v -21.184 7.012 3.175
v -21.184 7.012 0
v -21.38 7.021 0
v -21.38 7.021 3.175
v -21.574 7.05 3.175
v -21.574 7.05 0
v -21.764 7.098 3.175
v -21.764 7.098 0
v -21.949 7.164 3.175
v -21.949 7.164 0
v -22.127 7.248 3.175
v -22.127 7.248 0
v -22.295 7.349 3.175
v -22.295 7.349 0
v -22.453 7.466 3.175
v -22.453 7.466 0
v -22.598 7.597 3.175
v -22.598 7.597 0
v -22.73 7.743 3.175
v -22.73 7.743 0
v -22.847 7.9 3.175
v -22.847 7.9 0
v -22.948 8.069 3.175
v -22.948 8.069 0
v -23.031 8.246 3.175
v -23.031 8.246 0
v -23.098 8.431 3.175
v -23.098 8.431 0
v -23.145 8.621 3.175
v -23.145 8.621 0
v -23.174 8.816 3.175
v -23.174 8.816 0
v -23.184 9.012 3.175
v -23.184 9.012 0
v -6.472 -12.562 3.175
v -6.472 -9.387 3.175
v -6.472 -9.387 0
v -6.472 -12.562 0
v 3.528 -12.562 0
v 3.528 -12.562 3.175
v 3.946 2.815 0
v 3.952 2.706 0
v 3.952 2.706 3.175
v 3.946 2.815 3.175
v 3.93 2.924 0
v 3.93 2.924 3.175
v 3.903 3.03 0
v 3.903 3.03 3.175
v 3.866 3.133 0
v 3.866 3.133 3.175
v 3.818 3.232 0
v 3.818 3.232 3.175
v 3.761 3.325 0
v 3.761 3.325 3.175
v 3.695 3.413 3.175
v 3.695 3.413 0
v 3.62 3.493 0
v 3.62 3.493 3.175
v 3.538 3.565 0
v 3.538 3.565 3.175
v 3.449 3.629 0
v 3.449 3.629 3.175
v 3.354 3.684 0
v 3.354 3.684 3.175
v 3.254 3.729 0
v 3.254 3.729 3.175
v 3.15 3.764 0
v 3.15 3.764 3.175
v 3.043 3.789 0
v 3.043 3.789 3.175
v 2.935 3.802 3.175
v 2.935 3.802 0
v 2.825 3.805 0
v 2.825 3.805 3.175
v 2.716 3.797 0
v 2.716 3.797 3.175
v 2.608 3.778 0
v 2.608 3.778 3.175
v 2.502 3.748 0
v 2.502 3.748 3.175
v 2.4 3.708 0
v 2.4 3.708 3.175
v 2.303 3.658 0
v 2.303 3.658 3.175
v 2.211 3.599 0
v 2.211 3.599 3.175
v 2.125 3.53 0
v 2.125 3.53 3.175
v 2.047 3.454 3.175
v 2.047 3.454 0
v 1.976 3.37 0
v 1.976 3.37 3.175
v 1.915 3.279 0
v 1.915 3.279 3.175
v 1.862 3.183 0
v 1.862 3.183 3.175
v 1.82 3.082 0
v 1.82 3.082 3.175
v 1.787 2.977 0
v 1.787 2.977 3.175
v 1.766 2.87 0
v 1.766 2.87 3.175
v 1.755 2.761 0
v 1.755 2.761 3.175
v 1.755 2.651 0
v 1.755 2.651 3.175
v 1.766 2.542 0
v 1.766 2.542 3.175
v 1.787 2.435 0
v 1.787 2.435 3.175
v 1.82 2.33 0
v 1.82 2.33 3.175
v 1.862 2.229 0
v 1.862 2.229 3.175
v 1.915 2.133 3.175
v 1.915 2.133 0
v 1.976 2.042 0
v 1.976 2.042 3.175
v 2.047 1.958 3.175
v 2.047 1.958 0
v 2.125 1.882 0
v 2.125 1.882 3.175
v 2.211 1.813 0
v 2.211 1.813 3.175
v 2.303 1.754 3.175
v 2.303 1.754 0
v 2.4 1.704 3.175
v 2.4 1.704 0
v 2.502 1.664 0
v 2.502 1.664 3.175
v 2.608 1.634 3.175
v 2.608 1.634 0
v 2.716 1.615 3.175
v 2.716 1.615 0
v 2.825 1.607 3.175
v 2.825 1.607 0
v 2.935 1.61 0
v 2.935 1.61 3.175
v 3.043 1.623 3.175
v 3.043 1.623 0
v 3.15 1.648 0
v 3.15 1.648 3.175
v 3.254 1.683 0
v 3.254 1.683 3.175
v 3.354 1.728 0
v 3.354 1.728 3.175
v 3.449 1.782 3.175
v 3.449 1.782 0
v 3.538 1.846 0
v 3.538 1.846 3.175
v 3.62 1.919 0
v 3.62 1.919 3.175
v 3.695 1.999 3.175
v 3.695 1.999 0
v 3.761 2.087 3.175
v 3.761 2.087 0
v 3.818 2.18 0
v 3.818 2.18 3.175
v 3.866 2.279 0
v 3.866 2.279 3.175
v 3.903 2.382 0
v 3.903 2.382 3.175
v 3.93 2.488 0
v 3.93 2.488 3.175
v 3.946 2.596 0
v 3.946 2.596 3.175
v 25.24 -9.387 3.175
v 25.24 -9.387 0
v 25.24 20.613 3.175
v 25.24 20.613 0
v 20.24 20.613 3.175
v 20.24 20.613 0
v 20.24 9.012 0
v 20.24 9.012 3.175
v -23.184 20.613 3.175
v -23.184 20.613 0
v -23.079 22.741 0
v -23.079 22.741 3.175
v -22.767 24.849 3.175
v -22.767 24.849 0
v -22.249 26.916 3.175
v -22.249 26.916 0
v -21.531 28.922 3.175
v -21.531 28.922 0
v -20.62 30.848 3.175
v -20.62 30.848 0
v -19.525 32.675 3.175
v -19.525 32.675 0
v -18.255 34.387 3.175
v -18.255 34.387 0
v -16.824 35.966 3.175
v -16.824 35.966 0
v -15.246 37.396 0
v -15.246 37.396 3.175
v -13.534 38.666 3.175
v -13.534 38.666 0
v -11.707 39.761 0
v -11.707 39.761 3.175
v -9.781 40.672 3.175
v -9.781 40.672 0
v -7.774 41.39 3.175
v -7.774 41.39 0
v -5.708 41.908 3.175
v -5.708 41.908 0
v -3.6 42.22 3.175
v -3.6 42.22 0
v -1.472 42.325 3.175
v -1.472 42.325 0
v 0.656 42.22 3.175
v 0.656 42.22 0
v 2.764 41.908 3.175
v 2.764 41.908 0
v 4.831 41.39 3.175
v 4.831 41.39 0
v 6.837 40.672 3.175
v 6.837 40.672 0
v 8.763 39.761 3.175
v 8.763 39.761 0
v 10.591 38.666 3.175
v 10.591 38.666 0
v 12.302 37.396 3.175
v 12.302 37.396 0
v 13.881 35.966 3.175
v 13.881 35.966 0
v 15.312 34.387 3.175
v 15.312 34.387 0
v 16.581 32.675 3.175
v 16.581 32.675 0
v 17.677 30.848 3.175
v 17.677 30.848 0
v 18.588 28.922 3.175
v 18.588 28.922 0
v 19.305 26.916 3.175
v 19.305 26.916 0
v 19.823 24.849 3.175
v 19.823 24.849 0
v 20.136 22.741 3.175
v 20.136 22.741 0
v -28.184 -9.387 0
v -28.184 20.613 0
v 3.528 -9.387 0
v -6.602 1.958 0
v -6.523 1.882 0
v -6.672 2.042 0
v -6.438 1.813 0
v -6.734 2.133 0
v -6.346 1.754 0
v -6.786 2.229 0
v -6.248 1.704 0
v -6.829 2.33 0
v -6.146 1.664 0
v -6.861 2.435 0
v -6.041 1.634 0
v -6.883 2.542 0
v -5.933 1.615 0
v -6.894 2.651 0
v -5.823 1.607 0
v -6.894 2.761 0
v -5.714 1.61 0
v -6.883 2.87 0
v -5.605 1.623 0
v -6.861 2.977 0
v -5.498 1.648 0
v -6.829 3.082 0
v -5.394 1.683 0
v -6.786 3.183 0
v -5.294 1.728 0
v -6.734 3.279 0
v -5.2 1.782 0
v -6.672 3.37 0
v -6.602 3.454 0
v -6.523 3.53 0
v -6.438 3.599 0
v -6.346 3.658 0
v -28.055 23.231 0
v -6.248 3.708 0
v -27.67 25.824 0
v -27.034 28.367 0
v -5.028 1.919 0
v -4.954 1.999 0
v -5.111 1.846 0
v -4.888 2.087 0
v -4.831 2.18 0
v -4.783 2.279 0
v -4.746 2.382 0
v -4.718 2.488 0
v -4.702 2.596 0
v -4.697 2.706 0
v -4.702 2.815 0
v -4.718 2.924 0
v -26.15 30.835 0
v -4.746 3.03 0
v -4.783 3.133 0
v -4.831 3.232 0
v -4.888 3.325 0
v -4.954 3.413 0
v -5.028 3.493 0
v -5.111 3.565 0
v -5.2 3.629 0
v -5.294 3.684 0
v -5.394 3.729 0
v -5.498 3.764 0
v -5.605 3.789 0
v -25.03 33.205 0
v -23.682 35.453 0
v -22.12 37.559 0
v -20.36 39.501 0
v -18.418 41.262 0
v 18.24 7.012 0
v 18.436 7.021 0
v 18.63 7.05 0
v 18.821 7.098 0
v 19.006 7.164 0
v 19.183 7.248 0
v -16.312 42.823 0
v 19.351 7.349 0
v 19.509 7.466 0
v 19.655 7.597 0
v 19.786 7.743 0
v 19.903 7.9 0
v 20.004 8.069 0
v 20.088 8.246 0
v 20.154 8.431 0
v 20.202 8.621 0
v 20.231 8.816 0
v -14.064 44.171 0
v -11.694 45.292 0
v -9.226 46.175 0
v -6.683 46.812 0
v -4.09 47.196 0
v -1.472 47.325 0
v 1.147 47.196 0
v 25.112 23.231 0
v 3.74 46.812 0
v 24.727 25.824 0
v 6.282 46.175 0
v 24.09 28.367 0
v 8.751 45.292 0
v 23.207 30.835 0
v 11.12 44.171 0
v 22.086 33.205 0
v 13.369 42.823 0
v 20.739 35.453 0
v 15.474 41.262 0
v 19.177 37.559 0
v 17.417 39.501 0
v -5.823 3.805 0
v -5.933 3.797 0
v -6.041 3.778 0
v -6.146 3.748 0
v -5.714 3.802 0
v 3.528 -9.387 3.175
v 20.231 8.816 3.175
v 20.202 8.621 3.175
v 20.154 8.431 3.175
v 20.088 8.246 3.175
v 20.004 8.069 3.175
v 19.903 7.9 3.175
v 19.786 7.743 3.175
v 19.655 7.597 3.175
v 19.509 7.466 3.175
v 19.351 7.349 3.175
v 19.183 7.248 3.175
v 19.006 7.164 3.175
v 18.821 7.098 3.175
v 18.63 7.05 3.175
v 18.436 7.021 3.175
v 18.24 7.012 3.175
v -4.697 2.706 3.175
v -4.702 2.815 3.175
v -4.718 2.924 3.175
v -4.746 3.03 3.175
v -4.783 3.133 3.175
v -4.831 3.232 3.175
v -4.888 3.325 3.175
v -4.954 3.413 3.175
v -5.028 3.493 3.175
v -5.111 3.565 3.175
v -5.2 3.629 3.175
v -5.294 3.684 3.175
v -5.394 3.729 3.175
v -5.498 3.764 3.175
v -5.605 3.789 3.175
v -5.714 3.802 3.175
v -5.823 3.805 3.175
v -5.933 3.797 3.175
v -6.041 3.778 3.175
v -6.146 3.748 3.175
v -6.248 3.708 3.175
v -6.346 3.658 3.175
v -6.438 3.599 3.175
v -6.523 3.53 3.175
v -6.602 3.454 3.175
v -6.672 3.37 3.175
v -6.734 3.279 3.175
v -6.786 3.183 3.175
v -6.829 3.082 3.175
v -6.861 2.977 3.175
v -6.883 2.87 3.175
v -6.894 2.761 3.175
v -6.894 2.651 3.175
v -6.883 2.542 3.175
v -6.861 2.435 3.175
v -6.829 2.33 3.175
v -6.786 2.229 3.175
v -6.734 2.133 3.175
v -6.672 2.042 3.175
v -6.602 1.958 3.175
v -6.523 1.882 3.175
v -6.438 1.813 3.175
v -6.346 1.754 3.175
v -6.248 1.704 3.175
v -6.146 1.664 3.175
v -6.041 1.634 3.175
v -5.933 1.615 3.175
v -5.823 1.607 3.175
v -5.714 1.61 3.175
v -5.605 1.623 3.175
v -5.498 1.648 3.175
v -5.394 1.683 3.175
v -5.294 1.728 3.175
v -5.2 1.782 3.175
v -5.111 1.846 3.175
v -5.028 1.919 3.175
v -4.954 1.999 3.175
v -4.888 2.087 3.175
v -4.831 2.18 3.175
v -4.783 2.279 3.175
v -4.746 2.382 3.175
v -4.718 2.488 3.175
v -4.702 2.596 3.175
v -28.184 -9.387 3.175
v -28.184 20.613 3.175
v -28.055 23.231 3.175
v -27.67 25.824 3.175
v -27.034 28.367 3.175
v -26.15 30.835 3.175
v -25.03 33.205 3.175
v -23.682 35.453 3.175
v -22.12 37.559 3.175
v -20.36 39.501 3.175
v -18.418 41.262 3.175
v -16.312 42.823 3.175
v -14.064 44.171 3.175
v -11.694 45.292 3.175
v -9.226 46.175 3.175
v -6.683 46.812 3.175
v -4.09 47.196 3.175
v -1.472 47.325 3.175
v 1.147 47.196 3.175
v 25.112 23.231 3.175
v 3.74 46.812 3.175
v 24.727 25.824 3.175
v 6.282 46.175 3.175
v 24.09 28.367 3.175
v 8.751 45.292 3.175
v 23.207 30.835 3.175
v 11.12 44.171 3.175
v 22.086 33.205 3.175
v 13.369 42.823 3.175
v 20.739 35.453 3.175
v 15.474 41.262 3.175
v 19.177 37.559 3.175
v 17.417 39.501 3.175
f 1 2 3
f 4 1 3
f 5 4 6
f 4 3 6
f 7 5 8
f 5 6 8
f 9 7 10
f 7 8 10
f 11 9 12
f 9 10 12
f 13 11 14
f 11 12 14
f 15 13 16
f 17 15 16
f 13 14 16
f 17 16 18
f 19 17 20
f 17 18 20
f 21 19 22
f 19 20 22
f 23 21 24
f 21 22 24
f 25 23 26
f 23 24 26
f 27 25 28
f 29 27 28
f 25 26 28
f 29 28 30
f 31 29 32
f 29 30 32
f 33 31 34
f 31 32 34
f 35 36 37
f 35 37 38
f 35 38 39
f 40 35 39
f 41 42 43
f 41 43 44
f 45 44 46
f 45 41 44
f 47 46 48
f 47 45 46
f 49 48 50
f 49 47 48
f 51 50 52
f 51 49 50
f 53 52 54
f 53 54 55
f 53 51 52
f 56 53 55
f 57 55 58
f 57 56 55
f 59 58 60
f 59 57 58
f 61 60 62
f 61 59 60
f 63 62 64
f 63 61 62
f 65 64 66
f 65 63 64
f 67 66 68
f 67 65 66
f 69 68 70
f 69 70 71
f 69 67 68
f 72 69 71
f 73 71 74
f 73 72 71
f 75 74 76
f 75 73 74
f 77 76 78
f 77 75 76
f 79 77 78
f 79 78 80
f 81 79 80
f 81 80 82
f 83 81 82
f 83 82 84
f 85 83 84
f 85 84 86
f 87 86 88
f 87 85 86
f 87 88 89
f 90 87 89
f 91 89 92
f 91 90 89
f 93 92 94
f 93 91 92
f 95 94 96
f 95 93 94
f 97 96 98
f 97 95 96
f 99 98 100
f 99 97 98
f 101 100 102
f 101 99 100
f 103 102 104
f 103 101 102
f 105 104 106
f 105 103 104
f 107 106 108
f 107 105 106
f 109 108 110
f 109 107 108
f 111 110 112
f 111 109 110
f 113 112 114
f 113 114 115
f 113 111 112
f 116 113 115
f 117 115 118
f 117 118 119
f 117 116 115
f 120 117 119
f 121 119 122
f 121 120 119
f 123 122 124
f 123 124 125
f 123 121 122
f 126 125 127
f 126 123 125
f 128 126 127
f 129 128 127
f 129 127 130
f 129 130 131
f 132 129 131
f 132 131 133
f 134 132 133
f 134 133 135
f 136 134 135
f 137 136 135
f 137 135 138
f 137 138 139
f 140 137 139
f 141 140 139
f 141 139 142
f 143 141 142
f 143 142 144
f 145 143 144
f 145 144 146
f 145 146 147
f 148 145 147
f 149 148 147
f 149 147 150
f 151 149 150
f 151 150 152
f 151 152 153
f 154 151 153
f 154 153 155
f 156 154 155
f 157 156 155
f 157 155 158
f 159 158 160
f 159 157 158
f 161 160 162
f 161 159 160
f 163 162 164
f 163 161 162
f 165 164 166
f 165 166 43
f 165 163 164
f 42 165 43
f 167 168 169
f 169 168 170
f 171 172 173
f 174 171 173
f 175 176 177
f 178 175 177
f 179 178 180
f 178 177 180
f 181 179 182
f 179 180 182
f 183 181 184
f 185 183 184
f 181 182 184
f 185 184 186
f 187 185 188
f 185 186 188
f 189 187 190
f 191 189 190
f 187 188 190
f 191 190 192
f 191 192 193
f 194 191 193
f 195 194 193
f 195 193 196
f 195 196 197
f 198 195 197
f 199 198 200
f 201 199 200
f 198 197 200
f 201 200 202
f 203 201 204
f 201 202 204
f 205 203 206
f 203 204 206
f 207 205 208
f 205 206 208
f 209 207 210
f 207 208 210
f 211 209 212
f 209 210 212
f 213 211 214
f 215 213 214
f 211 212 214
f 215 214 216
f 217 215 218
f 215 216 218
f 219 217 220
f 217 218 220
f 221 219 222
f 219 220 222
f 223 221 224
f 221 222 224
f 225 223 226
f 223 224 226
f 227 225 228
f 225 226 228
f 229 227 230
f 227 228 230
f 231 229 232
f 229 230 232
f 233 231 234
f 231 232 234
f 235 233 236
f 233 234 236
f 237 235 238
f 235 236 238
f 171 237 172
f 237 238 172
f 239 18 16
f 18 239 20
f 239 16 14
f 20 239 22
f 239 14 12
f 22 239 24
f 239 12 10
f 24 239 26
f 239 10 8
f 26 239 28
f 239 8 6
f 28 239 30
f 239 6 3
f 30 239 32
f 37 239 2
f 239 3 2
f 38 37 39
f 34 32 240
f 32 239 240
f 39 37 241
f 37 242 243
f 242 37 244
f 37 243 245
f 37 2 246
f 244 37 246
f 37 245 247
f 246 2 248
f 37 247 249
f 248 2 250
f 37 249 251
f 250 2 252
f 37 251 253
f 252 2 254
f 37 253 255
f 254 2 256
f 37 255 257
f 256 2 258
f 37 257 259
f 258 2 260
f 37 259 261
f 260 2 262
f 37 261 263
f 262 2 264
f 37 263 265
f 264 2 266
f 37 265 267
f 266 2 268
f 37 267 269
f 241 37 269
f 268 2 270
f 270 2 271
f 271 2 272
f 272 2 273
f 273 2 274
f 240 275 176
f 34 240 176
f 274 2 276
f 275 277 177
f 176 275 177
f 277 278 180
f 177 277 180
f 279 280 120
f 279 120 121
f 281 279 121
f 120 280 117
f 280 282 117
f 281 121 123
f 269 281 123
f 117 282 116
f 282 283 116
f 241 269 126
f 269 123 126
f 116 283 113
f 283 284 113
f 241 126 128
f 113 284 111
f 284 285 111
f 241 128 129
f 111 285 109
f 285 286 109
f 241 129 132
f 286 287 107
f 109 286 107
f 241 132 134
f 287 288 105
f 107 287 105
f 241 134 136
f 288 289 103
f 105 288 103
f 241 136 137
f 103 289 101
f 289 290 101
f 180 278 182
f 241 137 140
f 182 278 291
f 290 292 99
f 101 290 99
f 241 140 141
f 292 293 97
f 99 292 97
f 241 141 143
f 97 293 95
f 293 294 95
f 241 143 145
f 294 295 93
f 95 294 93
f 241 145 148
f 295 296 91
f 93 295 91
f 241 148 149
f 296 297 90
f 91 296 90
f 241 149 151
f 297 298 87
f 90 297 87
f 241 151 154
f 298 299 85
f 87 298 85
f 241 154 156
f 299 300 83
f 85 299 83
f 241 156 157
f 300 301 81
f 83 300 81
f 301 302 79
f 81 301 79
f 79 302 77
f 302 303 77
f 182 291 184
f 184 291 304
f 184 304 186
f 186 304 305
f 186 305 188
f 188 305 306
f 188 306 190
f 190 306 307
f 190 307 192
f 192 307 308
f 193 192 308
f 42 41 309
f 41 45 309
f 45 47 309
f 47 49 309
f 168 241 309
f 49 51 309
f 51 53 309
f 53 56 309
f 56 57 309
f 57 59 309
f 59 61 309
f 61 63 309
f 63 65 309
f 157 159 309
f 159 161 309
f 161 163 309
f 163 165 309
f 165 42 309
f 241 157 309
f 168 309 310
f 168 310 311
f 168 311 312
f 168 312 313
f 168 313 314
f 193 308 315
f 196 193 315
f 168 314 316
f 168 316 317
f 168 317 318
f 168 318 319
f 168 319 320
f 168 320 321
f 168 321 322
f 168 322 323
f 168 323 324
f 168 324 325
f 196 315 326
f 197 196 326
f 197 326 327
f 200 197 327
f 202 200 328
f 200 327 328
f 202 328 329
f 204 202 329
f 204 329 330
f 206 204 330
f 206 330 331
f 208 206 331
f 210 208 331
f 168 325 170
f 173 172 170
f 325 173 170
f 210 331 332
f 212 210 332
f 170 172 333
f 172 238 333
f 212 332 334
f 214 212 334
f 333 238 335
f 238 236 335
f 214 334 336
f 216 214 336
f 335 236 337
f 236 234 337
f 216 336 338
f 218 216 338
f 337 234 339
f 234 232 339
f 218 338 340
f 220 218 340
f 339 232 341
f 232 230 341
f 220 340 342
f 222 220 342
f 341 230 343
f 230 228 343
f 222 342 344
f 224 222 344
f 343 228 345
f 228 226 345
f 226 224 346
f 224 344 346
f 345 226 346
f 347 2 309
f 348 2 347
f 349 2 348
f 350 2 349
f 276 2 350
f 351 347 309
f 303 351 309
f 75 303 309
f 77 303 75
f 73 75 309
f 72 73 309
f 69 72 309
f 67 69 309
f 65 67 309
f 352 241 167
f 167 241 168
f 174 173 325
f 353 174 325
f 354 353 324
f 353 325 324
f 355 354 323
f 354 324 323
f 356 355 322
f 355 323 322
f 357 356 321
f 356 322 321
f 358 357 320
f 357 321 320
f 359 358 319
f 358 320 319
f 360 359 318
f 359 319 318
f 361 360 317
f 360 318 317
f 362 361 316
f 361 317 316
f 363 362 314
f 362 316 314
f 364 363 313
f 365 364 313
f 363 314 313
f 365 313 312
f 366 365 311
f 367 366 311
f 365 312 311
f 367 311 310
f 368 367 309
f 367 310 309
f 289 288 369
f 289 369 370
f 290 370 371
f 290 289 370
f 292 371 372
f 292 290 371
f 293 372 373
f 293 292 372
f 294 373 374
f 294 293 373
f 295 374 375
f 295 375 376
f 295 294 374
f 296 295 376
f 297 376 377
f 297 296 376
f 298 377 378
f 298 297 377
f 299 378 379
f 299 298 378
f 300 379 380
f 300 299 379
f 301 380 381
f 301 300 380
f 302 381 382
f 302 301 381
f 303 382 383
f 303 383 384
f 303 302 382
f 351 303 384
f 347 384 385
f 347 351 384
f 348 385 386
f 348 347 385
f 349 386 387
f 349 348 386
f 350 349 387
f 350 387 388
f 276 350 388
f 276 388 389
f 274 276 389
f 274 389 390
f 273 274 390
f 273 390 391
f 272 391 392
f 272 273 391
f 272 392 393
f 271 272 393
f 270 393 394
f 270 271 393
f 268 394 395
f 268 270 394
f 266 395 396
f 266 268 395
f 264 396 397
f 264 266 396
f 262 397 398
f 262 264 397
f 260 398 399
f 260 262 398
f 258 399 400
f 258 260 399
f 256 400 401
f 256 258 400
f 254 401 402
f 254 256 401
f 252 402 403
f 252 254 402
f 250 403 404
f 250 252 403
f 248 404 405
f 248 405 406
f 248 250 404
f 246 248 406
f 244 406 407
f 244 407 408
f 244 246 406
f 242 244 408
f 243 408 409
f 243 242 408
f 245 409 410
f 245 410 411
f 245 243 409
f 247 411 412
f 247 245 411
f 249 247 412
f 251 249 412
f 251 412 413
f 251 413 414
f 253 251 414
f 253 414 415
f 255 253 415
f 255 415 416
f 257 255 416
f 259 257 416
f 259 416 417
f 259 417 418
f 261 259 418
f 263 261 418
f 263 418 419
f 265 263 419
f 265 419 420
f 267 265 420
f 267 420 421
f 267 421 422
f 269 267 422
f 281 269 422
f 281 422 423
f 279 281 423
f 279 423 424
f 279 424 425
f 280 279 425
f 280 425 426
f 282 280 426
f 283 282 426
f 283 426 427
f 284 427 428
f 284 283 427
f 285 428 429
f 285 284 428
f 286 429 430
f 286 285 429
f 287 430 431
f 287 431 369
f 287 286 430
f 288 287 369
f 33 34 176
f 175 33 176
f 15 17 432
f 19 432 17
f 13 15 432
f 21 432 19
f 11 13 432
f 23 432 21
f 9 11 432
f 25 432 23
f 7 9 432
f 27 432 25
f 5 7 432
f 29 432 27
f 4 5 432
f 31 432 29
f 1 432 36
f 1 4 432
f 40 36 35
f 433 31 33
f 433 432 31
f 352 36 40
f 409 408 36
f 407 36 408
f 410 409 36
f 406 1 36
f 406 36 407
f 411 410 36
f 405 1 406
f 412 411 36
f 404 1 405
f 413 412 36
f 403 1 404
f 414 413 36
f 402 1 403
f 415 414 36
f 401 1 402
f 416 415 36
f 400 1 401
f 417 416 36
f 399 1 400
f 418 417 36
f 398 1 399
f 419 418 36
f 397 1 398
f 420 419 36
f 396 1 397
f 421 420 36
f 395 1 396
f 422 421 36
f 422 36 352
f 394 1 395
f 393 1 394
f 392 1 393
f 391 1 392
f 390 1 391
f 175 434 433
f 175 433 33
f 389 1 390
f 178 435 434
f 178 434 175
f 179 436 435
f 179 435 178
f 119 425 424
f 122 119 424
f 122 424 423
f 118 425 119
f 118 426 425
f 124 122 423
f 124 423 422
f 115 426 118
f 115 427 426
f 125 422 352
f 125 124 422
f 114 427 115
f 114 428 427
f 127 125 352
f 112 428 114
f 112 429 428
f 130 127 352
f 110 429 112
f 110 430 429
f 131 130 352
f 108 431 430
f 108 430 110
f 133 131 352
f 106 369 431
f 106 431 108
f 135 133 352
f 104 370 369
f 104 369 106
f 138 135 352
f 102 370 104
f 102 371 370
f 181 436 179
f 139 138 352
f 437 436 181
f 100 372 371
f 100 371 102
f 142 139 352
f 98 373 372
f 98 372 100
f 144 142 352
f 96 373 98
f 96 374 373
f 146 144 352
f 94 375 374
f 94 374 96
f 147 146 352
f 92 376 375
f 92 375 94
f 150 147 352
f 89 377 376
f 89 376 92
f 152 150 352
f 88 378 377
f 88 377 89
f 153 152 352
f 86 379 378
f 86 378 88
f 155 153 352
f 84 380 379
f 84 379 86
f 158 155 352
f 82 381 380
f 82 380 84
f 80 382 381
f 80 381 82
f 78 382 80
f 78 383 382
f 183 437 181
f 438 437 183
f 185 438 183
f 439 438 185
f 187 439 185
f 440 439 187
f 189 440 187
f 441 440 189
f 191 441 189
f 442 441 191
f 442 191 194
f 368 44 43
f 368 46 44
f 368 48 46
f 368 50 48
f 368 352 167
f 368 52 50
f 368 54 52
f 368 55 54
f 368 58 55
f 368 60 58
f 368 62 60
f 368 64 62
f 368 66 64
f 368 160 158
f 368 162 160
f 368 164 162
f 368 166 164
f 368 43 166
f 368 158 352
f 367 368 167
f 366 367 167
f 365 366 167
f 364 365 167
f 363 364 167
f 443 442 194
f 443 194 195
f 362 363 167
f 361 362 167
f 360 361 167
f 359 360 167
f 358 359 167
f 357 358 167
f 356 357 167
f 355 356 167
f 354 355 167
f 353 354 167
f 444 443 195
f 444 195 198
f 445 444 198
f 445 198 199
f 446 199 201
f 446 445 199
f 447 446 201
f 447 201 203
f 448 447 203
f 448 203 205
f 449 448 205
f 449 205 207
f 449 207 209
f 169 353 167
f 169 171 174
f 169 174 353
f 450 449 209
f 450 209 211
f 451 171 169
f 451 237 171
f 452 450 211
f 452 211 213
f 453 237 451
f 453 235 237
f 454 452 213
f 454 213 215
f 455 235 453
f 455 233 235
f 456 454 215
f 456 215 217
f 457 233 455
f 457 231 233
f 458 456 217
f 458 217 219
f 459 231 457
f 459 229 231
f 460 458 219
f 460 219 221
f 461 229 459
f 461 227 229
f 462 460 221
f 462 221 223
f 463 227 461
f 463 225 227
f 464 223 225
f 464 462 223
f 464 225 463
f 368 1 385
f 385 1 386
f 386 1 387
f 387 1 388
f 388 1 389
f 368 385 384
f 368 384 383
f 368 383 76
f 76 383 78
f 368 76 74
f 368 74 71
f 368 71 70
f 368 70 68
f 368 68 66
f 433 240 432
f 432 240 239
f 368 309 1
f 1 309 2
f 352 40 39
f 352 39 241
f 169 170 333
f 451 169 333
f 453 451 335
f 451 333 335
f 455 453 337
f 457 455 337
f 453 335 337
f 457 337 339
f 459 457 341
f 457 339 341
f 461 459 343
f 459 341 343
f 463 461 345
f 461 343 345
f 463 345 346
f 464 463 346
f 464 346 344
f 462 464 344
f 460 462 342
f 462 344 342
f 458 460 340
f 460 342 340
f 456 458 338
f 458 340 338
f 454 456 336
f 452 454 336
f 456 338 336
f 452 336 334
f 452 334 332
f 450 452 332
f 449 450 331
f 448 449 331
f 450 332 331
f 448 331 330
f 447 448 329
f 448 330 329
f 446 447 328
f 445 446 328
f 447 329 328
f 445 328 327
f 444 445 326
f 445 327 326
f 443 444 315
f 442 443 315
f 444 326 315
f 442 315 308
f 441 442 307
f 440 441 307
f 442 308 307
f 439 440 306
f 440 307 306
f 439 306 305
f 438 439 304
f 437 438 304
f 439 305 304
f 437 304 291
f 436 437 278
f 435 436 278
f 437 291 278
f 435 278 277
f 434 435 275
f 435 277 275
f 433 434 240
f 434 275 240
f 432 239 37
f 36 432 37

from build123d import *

# Parameters (mm, degrees)
F0_R     = 1.09933
F1_DEPTH = 3.175


with BuildPart() as f1:
    # F0 (on Top) → F1 (new body)
    with BuildSketch(Plane.XY):
        with BuildLine():
            Line((-28.183714, 20.612877), (-28.183714, -9.387123))
            Line((-28.183714, -9.387123), (-6.471708, -9.387123))
            Line((-6.471708, -9.387123), (-6.471708, -12.562123))
            Line((-6.471708, -12.562123), (3.528292, -12.562123))
            Line((3.528292, -12.562123), (3.528292, -9.387123))
            Line((3.528292, -9.387123), (25.240297, -9.387123))
            Line((25.240297, -9.387123), (25.240297, 20.612877))
            ThreePointArc((25.240297, 20.612877), (-1.471708, 47.324882), (-28.183714, 20.612877))
        make_face()
        with Locations((-5.796011, 2.705928)):
            Circle(F0_R, mode=Mode.SUBTRACT)
        with Locations((2.852595, 2.705928)):
            Circle(F0_R, mode=Mode.SUBTRACT)
        with BuildLine():
            ThreePointArc((-23.183714, 20.612877), (-1.471708, 42.324882), (20.240297, 20.612877))
            Line((20.240297, 20.612877), (20.240297, 9.01164))
            ThreePointArc((20.240297, 9.01164), (19.654511, 7.597426), (18.240297, 7.01164))
            Line((18.240297, 7.01164), (-21.183714, 7.01164))
            ThreePointArc((-21.183714, 7.01164), (-22.597927, 7.597426), (-23.183714, 9.01164))
            Line((-23.183714, 9.01164), (-23.183714, 20.612877))
        make_face(mode=Mode.SUBTRACT)
    extrude(amount=F1_DEPTH)


solid = f1.part
